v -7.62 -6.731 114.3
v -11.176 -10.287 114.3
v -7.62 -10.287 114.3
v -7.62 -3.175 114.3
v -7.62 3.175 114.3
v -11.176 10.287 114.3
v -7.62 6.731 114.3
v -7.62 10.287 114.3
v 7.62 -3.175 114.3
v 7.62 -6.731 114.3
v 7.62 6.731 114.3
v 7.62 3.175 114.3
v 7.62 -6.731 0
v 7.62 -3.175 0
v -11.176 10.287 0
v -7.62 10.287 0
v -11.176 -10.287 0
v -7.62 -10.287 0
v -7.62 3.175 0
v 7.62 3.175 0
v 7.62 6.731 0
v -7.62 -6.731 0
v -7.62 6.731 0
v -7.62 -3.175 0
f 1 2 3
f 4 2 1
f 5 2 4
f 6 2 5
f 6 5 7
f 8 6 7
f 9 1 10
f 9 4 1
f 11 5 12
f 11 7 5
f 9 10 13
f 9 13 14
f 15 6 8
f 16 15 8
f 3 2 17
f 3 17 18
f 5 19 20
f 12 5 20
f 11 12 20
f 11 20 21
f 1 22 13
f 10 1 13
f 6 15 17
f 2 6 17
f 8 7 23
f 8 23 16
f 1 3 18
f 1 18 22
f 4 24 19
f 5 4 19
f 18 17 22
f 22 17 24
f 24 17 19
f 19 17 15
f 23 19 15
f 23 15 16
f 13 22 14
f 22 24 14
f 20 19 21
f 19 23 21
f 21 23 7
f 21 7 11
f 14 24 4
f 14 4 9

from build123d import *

# Parameters (mm, degrees)
F0_W     = 3.556
F0_H     = 3.556
F0_W_2   = 15.24
F1_DEPTH = 114.3


with BuildPart() as f1:
    # F0 (on Top) → F1 (new body)
    with BuildSketch(Plane.XY):
        Polygon((-7.62, -3.175), (-7.62, 3.175), (-7.62, 6.731), (-11.176, 6.731), (-11.176, -6.731), (-7.62, -6.731), align=None)
        with Locations((-9.398, 8.509)):
            Rectangle(F0_W, F0_H)
        with Locations((-9.398, -8.509)):
            Rectangle(F0_W, F0_H)
        with Locations((0, -4.953)):
            Rectangle(F0_W_2, F0_H)
        with Locations((0, 4.953)):
            Rectangle(F0_W_2, F0_H)
    extrude(amount=F1_DEPTH)


solid = f1.part
